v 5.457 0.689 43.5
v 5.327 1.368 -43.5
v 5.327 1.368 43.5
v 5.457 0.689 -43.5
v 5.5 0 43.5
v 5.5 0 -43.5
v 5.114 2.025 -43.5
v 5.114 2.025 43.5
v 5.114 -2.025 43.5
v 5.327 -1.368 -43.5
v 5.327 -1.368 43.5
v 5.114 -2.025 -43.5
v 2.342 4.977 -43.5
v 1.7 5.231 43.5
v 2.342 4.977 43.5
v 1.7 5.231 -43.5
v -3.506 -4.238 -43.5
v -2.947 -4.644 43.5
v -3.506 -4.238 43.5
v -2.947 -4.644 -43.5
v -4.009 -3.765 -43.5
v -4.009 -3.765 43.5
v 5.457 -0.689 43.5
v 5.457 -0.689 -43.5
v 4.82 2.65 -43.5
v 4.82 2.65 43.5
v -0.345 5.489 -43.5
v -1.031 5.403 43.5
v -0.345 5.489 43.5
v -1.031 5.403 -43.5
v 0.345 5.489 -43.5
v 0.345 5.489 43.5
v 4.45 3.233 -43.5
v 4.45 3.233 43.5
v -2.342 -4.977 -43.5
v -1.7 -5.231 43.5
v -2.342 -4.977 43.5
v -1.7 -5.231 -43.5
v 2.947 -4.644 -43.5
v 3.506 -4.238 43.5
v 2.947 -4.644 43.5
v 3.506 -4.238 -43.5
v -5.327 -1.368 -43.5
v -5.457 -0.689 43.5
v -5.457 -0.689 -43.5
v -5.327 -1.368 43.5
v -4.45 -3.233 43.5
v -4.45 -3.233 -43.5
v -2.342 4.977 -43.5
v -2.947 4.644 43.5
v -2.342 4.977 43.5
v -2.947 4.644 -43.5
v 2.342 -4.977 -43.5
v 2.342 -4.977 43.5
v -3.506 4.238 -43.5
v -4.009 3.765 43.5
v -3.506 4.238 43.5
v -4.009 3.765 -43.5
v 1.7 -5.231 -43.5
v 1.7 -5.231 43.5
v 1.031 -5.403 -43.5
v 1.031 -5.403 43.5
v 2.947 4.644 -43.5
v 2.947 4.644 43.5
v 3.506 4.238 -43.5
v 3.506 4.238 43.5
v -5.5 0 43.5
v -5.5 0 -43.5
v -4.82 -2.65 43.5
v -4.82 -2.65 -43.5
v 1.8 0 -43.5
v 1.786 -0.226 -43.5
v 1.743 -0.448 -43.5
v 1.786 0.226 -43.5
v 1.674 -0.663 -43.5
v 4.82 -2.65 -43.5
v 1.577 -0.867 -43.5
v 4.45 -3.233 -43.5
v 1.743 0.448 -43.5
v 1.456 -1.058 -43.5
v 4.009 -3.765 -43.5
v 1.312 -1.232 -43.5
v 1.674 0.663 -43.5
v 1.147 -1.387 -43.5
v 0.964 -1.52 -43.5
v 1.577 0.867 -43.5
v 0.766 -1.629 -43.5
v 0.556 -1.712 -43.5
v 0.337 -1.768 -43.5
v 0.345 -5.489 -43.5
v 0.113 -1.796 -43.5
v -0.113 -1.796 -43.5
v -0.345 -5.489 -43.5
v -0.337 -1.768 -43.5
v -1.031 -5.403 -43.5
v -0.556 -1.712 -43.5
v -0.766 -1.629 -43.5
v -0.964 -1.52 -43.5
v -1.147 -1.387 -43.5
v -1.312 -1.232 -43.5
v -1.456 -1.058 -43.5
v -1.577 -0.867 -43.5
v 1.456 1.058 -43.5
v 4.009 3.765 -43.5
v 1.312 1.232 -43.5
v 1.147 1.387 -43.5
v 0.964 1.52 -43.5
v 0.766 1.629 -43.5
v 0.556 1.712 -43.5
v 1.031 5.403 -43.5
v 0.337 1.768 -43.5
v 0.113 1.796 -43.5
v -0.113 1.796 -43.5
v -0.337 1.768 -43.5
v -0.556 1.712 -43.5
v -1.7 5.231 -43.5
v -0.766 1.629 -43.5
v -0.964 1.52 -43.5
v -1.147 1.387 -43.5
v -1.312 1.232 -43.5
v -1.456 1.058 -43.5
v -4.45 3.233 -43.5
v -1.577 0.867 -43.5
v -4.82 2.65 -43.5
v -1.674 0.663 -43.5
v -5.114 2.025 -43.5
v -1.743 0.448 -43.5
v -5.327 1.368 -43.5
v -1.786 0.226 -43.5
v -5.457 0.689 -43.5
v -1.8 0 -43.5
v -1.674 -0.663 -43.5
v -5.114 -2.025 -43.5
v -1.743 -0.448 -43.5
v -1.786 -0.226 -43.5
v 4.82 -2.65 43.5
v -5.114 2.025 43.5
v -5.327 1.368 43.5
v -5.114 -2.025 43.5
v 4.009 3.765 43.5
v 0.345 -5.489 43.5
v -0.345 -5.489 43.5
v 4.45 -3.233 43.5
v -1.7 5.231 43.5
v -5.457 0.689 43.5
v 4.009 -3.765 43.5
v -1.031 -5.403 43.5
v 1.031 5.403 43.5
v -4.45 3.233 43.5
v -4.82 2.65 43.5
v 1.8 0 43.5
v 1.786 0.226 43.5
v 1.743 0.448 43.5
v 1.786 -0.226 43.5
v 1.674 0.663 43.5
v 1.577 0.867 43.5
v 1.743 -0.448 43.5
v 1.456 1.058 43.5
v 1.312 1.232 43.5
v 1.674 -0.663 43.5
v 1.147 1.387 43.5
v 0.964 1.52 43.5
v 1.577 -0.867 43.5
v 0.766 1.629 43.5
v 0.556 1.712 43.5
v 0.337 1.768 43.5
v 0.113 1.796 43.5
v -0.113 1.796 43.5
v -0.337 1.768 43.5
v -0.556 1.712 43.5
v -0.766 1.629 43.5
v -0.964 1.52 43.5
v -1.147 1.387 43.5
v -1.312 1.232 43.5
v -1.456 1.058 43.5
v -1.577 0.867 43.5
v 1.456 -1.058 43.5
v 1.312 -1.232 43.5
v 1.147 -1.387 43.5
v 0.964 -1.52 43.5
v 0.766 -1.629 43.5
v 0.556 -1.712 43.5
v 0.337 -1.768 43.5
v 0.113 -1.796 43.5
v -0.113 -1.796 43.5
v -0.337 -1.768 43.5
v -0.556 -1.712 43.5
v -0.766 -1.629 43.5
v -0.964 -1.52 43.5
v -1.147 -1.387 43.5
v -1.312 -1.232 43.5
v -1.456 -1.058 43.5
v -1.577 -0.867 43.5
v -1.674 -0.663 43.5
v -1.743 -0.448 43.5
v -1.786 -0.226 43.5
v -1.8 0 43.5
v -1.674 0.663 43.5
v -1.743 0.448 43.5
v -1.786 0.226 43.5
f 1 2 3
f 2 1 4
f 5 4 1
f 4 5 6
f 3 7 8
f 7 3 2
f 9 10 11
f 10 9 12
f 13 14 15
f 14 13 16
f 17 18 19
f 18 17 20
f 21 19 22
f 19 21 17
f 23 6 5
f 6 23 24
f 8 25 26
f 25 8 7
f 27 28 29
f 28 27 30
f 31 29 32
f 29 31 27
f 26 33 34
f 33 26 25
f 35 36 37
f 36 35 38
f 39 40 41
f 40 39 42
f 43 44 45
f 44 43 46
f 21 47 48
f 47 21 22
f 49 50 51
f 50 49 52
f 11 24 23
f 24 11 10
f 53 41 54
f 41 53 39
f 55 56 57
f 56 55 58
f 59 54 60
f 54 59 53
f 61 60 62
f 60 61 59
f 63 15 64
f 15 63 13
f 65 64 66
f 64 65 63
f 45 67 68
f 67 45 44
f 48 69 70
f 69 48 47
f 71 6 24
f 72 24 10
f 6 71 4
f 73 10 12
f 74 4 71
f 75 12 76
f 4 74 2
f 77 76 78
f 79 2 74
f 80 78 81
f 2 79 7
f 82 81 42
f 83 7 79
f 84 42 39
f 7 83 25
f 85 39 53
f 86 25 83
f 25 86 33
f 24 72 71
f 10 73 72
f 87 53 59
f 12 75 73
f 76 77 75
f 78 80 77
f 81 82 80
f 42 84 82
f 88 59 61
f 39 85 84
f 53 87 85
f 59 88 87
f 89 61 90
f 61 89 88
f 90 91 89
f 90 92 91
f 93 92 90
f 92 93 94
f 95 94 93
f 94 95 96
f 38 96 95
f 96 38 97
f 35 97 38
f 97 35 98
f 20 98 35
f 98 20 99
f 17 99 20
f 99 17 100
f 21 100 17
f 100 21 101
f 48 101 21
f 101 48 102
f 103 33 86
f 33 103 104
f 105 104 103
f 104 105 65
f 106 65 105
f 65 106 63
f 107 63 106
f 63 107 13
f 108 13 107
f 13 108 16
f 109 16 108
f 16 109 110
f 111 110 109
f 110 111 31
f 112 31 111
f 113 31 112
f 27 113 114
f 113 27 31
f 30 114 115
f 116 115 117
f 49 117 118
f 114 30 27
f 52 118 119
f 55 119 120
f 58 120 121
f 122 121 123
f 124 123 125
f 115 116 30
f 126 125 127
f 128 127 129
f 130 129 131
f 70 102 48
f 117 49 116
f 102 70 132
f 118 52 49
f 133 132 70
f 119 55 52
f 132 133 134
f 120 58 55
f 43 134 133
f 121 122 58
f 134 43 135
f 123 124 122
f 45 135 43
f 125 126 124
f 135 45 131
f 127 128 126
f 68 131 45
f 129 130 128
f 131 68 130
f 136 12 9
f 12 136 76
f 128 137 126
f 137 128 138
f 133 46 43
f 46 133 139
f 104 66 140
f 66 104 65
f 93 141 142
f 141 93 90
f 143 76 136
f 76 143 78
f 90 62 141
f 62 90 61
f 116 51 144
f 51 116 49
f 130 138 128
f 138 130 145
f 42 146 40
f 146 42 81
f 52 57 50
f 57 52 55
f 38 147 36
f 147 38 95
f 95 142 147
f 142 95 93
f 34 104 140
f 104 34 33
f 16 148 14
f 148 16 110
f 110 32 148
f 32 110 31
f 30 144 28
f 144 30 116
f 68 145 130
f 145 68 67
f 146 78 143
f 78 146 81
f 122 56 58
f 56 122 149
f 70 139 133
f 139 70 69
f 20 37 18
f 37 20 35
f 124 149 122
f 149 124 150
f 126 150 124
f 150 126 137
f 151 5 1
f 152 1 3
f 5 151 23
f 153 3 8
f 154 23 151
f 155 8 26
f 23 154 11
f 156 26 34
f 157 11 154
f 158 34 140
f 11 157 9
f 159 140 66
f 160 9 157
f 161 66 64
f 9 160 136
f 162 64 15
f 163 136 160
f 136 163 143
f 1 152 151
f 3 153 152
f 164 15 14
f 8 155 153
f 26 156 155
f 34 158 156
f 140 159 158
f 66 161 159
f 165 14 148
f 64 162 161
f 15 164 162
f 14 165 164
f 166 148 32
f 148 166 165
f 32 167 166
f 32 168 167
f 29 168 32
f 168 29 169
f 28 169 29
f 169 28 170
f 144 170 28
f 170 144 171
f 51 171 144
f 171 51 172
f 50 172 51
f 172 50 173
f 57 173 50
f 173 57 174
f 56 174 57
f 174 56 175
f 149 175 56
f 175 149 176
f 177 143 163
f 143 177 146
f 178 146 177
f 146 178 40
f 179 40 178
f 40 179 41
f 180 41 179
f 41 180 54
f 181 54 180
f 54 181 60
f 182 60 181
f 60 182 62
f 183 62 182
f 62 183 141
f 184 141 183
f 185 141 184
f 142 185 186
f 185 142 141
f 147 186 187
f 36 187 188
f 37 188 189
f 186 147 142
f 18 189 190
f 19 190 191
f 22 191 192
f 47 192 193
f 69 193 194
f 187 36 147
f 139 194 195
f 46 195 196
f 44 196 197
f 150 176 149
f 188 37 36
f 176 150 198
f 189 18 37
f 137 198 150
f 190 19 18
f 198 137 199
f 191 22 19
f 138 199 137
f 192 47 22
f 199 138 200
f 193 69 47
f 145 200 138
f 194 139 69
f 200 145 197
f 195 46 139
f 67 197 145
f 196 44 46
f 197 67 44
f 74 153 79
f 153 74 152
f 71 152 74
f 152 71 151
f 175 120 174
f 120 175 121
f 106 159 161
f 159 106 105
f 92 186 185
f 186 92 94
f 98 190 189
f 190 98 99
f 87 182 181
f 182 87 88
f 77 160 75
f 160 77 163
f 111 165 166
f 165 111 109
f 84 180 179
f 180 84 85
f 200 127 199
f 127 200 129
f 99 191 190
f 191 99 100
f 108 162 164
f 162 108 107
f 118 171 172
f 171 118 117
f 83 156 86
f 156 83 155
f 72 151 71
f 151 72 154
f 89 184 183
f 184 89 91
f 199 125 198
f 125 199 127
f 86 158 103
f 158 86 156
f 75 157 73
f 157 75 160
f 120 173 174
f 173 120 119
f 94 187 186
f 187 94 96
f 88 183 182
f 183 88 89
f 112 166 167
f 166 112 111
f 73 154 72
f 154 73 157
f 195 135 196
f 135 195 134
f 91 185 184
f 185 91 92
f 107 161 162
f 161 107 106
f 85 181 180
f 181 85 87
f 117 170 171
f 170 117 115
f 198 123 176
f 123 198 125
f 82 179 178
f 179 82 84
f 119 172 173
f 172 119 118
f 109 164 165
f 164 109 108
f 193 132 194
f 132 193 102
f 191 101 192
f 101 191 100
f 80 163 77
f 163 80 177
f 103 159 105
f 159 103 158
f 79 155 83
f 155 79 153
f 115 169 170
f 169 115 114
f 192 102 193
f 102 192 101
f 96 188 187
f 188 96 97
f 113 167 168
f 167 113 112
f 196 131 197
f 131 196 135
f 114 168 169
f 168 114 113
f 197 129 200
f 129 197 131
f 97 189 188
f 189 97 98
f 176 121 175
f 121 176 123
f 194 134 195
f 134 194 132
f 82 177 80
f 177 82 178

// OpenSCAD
$fn = 50;


difference() {
	union() {
		translate(v = [0, 0, -43.5000000000]) {
			cylinder(h = 87, r = 5.5000000000);
		}
	}
	union() {
		#translate(v = [0, 0, -100.0000000000]) {
			cylinder(h = 200, r = 1.8000000000);
		}
	}
}
